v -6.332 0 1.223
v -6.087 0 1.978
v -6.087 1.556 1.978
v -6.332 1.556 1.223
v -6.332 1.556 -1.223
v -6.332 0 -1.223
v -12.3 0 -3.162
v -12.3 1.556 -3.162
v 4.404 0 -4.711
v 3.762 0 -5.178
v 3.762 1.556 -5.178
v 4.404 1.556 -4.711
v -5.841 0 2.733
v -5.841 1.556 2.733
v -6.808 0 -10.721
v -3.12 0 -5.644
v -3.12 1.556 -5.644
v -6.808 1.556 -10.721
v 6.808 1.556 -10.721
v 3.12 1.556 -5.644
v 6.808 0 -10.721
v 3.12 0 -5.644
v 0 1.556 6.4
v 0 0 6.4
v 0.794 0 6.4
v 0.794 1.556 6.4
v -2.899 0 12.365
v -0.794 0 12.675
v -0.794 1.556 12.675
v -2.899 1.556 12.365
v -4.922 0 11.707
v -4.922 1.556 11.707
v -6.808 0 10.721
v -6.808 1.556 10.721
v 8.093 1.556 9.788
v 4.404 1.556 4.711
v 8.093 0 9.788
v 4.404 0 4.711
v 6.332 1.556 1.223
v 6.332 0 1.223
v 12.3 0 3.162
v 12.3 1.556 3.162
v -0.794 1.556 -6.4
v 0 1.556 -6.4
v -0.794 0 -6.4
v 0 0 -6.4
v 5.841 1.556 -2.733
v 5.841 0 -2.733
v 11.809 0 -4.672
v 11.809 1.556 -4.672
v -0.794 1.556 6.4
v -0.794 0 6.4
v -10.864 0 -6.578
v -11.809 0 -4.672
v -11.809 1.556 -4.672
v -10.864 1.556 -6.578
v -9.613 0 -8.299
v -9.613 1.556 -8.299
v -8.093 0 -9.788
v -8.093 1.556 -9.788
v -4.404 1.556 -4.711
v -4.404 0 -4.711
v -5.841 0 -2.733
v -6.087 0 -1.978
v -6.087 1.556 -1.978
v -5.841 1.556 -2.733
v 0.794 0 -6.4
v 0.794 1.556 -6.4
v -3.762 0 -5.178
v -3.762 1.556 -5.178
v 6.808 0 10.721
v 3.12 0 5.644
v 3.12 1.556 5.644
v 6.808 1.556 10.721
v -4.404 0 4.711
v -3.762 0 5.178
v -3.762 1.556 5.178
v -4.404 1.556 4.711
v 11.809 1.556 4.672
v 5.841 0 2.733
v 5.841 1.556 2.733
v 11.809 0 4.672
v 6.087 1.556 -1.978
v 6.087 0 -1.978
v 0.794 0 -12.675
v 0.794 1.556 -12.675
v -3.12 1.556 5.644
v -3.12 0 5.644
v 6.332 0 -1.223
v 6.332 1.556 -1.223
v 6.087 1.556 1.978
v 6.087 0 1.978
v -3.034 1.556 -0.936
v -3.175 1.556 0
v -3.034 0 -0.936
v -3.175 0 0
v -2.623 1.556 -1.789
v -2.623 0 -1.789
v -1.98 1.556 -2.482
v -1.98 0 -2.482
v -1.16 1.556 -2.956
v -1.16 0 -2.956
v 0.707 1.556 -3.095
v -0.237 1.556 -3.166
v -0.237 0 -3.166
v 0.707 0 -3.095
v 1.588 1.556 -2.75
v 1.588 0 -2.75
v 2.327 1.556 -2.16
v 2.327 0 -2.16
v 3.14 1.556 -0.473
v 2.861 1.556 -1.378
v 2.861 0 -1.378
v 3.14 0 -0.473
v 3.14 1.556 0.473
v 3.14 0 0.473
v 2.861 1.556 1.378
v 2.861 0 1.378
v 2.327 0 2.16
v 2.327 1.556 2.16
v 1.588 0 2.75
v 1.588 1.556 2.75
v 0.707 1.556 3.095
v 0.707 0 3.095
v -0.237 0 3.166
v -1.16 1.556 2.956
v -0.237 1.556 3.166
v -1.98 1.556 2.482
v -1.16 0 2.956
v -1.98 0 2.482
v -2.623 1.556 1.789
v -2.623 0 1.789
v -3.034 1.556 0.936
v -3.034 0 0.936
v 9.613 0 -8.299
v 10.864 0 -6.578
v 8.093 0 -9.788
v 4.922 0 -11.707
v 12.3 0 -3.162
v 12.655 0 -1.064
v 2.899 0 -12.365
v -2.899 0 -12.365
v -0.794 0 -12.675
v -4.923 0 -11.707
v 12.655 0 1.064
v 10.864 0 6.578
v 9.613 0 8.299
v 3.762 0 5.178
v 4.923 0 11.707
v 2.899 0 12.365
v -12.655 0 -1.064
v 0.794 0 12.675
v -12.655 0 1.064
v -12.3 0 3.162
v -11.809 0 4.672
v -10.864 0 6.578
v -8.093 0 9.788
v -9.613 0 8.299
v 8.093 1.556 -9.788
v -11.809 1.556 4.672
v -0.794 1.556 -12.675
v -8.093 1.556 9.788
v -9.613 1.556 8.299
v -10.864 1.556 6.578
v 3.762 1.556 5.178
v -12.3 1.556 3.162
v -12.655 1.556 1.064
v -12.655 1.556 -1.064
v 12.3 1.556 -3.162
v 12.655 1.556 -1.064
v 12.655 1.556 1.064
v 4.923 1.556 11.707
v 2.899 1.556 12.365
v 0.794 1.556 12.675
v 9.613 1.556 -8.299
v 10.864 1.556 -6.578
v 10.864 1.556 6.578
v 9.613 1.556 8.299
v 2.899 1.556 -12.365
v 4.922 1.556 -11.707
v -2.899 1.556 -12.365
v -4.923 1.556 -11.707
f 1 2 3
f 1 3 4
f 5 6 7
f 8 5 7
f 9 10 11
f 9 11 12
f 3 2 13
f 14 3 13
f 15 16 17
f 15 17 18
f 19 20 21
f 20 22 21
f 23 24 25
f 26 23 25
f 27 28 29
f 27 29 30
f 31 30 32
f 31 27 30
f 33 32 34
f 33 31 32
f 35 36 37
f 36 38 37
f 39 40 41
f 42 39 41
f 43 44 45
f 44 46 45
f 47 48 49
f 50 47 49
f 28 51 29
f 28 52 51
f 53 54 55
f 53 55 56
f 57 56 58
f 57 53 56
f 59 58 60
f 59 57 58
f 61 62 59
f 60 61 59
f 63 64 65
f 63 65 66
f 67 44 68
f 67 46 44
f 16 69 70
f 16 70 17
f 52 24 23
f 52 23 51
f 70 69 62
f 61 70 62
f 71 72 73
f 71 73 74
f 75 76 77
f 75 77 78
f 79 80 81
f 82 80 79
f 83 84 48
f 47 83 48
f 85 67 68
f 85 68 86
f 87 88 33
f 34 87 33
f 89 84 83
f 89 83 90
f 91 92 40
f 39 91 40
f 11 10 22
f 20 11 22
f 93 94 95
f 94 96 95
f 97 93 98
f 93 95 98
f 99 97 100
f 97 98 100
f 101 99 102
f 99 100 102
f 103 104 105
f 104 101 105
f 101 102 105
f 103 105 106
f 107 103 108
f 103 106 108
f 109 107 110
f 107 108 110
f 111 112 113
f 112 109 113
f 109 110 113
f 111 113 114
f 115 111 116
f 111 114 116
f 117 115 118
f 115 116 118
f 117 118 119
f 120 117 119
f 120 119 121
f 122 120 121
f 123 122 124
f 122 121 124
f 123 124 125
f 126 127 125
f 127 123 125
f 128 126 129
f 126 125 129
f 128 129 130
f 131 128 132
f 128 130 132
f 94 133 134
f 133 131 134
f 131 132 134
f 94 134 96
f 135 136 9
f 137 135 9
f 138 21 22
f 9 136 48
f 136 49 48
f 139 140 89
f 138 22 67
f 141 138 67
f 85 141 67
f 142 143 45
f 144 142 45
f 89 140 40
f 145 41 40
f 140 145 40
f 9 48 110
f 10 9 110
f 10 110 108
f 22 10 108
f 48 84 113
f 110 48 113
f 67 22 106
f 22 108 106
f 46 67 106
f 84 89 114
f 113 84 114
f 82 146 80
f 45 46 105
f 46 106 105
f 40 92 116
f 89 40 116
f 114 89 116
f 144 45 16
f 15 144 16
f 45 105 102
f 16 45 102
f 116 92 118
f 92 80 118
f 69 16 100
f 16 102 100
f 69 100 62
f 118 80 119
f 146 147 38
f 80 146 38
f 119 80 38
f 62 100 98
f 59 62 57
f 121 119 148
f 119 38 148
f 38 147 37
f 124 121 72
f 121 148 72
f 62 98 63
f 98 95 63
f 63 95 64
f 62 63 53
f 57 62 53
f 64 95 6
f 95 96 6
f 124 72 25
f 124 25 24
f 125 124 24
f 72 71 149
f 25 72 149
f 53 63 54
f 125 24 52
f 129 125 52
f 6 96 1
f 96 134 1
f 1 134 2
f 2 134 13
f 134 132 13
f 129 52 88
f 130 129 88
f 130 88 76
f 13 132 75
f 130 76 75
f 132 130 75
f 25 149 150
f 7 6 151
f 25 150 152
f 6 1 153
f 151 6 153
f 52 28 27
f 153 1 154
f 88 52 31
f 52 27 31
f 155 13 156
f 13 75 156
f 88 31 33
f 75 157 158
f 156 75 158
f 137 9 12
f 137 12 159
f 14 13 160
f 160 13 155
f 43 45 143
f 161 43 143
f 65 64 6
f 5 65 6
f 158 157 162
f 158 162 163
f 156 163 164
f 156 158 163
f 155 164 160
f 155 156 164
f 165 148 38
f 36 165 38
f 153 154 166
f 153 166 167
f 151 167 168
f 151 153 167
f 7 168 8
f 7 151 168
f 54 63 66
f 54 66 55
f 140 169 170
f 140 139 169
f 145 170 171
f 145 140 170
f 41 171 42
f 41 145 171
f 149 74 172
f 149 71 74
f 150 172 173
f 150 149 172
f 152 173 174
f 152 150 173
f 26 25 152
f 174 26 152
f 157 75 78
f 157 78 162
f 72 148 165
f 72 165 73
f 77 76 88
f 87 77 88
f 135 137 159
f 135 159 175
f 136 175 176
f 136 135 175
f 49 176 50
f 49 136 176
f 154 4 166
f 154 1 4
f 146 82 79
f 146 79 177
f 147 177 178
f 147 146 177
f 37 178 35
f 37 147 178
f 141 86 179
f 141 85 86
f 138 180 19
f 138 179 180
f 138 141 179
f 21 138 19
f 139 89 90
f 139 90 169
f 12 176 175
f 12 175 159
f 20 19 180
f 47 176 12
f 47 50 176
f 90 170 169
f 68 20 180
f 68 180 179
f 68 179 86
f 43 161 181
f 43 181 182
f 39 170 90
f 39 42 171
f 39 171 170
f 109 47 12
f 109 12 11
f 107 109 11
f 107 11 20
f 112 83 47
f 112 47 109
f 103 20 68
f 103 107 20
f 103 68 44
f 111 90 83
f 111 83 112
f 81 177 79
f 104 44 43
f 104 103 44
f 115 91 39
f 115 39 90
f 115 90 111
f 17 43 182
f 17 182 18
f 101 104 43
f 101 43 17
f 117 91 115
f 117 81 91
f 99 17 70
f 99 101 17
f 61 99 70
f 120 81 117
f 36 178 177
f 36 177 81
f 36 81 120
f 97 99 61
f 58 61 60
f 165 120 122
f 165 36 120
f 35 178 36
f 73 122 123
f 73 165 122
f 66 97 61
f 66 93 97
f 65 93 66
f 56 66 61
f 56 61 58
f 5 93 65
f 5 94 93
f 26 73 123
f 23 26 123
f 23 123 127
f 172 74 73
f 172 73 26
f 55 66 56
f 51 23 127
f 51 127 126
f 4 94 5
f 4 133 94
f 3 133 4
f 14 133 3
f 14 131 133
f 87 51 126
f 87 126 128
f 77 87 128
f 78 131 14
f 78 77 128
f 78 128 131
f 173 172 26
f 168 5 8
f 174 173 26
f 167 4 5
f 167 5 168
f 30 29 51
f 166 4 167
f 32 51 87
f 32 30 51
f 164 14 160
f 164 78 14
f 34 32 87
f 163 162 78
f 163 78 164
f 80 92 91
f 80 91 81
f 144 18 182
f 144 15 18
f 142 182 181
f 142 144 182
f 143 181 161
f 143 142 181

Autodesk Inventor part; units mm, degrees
ref_plane "YZ Plane" through (0, 0, 0) normal (1, 0, 0) x (0, 1, 0)
ref_plane "XZ Plane" through (0, 0, 0) normal (0, 1, 0) x (-1, 0, 0)
ref_plane "XY Plane" through (0, 0, 0) normal (0, 0, 1) x (1, 0, 0)
sketch "Sketch1" plane through (0, 0, 0) normal (0, 1, 0) x (-1, 0, 0)
  line L0 (0, 6.4) -> (0.794, 6.4)
  line L1 (0, 6.4) -> (-0.794, 6.4)
  line L2 (0.794, 6.4) -> (0.794, 12.6752)
  line L3 (-0.794, 6.4) -> (-0.794, 12.6752)
  line L4 (3.7618, 5.1777) -> (4.4042, 4.711)
  line L5 (3.7618, 5.1777) -> (3.1195, 5.6444)
  line L6 (4.4042, 4.711) -> (8.0926, 9.7877)
  line L7 (3.1195, 5.6444) -> (6.8079, 10.7211)
  line L8 (6.0868, 1.9777) -> (6.3321, 1.2226)
  line L9 (6.0868, 1.9777) -> (5.8414, 2.7328)
  line L10 (6.3321, 1.2226) -> (12.3001, 3.1617)
  line L11 (5.8414, 2.7328) -> (11.8094, 4.672)
  line L12 (6.0868, -1.9777) -> (5.8414, -2.7328)
  line L13 (6.0868, -1.9777) -> (6.3321, -1.2226)
  line L14 (5.8414, -2.7328) -> (11.8094, -4.672)
  line L15 (6.3321, -1.2226) -> (12.3001, -3.1617)
  line L16 (3.7618, -5.1777) -> (3.1195, -5.6444)
  line L17 (3.7618, -5.1777) -> (4.4042, -4.711)
  line L18 (3.1195, -5.6444) -> (6.8079, -10.7211)
  line L19 (4.4042, -4.711) -> (8.0926, -9.7877)
  line L20 (0, -6.4) -> (-0.794, -6.4)
  line L21 (0, -6.4) -> (0.794, -6.4)
  line L22 (-0.794, -6.4) -> (-0.794, -12.6752)
  line L23 (0.794, -6.4) -> (0.794, -12.6752)
  line L24 (-3.7618, -5.1777) -> (-4.4042, -4.711)
  line L25 (-3.7618, -5.1777) -> (-3.1195, -5.6444)
  line L26 (-4.4042, -4.711) -> (-8.0926, -9.7877)
  line L27 (-3.1195, -5.6444) -> (-6.8079, -10.7211)
  line L28 (-6.0868, -1.9777) -> (-6.3321, -1.2226)
  line L29 (-6.0868, -1.9777) -> (-5.8414, -2.7328)
  line L30 (-6.3321, -1.2226) -> (-12.3001, -3.1617)
  line L31 (-5.8414, -2.7328) -> (-11.8094, -4.672)
  line L32 (-6.0868, 1.9777) -> (-5.8414, 2.7328)
  line L33 (-6.0868, 1.9777) -> (-6.3321, 1.2226)
  line L34 (-5.8414, 2.7328) -> (-11.8094, 4.672)
  line L35 (-6.3321, 1.2226) -> (-12.3001, 3.1617)
  line L36 (-3.7618, 5.1777) -> (-3.1195, 5.6444)
  line L37 (-3.7618, 5.1777) -> (-4.4042, 4.711)
  line L38 (-3.1195, 5.6444) -> (-6.8079, 10.7211)
  line L39 (-4.4042, 4.711) -> (-8.0926, 9.7877)
  arc A0 (6.8079, 10.7211) -> (0.794, 12.6752) centre (0, 0) ccw
  arc A1 (-0.794, 12.6752) -> (-6.8079, 10.7211) centre (0, 0) ccw
  arc A2 (-8.0926, 9.7877) -> (-11.8094, 4.672) centre (0, 0) ccw
  arc A3 (-12.3001, 3.1617) -> (-12.3001, -3.1617) centre (0, 0) ccw
  arc A4 (-11.8094, -4.672) -> (-8.0926, -9.7877) centre (0, 0) ccw
  arc A5 (-6.8079, -10.7211) -> (-0.794, -12.6752) centre (0, 0) ccw
  arc A6 (0.794, -12.6752) -> (6.8079, -10.7211) centre (0, 0) ccw
  arc A7 (8.0926, -9.7877) -> (11.8094, -4.672) centre (0, 0) ccw
  arc A8 (12.3001, -3.1617) -> (12.3001, 3.1617) centre (0, 0) ccw
  arc A9 (11.8094, 4.672) -> (8.0926, 9.7877) centre (0, 0) ccw
  circle A10 centre (0, 0) radius 3.175
  dimension "d1" = 0.794
  dimension "d2" = 0.794
  dimension "d3" = 6.4
  dimension "d6" = 360
  dimension "d8" = 12.7
  dimension "d9" = 6.35
extrude "Extrusion1" add sketch "Sketch1" along normal blind 1.556
properties part number "HeatSinkWasher"
